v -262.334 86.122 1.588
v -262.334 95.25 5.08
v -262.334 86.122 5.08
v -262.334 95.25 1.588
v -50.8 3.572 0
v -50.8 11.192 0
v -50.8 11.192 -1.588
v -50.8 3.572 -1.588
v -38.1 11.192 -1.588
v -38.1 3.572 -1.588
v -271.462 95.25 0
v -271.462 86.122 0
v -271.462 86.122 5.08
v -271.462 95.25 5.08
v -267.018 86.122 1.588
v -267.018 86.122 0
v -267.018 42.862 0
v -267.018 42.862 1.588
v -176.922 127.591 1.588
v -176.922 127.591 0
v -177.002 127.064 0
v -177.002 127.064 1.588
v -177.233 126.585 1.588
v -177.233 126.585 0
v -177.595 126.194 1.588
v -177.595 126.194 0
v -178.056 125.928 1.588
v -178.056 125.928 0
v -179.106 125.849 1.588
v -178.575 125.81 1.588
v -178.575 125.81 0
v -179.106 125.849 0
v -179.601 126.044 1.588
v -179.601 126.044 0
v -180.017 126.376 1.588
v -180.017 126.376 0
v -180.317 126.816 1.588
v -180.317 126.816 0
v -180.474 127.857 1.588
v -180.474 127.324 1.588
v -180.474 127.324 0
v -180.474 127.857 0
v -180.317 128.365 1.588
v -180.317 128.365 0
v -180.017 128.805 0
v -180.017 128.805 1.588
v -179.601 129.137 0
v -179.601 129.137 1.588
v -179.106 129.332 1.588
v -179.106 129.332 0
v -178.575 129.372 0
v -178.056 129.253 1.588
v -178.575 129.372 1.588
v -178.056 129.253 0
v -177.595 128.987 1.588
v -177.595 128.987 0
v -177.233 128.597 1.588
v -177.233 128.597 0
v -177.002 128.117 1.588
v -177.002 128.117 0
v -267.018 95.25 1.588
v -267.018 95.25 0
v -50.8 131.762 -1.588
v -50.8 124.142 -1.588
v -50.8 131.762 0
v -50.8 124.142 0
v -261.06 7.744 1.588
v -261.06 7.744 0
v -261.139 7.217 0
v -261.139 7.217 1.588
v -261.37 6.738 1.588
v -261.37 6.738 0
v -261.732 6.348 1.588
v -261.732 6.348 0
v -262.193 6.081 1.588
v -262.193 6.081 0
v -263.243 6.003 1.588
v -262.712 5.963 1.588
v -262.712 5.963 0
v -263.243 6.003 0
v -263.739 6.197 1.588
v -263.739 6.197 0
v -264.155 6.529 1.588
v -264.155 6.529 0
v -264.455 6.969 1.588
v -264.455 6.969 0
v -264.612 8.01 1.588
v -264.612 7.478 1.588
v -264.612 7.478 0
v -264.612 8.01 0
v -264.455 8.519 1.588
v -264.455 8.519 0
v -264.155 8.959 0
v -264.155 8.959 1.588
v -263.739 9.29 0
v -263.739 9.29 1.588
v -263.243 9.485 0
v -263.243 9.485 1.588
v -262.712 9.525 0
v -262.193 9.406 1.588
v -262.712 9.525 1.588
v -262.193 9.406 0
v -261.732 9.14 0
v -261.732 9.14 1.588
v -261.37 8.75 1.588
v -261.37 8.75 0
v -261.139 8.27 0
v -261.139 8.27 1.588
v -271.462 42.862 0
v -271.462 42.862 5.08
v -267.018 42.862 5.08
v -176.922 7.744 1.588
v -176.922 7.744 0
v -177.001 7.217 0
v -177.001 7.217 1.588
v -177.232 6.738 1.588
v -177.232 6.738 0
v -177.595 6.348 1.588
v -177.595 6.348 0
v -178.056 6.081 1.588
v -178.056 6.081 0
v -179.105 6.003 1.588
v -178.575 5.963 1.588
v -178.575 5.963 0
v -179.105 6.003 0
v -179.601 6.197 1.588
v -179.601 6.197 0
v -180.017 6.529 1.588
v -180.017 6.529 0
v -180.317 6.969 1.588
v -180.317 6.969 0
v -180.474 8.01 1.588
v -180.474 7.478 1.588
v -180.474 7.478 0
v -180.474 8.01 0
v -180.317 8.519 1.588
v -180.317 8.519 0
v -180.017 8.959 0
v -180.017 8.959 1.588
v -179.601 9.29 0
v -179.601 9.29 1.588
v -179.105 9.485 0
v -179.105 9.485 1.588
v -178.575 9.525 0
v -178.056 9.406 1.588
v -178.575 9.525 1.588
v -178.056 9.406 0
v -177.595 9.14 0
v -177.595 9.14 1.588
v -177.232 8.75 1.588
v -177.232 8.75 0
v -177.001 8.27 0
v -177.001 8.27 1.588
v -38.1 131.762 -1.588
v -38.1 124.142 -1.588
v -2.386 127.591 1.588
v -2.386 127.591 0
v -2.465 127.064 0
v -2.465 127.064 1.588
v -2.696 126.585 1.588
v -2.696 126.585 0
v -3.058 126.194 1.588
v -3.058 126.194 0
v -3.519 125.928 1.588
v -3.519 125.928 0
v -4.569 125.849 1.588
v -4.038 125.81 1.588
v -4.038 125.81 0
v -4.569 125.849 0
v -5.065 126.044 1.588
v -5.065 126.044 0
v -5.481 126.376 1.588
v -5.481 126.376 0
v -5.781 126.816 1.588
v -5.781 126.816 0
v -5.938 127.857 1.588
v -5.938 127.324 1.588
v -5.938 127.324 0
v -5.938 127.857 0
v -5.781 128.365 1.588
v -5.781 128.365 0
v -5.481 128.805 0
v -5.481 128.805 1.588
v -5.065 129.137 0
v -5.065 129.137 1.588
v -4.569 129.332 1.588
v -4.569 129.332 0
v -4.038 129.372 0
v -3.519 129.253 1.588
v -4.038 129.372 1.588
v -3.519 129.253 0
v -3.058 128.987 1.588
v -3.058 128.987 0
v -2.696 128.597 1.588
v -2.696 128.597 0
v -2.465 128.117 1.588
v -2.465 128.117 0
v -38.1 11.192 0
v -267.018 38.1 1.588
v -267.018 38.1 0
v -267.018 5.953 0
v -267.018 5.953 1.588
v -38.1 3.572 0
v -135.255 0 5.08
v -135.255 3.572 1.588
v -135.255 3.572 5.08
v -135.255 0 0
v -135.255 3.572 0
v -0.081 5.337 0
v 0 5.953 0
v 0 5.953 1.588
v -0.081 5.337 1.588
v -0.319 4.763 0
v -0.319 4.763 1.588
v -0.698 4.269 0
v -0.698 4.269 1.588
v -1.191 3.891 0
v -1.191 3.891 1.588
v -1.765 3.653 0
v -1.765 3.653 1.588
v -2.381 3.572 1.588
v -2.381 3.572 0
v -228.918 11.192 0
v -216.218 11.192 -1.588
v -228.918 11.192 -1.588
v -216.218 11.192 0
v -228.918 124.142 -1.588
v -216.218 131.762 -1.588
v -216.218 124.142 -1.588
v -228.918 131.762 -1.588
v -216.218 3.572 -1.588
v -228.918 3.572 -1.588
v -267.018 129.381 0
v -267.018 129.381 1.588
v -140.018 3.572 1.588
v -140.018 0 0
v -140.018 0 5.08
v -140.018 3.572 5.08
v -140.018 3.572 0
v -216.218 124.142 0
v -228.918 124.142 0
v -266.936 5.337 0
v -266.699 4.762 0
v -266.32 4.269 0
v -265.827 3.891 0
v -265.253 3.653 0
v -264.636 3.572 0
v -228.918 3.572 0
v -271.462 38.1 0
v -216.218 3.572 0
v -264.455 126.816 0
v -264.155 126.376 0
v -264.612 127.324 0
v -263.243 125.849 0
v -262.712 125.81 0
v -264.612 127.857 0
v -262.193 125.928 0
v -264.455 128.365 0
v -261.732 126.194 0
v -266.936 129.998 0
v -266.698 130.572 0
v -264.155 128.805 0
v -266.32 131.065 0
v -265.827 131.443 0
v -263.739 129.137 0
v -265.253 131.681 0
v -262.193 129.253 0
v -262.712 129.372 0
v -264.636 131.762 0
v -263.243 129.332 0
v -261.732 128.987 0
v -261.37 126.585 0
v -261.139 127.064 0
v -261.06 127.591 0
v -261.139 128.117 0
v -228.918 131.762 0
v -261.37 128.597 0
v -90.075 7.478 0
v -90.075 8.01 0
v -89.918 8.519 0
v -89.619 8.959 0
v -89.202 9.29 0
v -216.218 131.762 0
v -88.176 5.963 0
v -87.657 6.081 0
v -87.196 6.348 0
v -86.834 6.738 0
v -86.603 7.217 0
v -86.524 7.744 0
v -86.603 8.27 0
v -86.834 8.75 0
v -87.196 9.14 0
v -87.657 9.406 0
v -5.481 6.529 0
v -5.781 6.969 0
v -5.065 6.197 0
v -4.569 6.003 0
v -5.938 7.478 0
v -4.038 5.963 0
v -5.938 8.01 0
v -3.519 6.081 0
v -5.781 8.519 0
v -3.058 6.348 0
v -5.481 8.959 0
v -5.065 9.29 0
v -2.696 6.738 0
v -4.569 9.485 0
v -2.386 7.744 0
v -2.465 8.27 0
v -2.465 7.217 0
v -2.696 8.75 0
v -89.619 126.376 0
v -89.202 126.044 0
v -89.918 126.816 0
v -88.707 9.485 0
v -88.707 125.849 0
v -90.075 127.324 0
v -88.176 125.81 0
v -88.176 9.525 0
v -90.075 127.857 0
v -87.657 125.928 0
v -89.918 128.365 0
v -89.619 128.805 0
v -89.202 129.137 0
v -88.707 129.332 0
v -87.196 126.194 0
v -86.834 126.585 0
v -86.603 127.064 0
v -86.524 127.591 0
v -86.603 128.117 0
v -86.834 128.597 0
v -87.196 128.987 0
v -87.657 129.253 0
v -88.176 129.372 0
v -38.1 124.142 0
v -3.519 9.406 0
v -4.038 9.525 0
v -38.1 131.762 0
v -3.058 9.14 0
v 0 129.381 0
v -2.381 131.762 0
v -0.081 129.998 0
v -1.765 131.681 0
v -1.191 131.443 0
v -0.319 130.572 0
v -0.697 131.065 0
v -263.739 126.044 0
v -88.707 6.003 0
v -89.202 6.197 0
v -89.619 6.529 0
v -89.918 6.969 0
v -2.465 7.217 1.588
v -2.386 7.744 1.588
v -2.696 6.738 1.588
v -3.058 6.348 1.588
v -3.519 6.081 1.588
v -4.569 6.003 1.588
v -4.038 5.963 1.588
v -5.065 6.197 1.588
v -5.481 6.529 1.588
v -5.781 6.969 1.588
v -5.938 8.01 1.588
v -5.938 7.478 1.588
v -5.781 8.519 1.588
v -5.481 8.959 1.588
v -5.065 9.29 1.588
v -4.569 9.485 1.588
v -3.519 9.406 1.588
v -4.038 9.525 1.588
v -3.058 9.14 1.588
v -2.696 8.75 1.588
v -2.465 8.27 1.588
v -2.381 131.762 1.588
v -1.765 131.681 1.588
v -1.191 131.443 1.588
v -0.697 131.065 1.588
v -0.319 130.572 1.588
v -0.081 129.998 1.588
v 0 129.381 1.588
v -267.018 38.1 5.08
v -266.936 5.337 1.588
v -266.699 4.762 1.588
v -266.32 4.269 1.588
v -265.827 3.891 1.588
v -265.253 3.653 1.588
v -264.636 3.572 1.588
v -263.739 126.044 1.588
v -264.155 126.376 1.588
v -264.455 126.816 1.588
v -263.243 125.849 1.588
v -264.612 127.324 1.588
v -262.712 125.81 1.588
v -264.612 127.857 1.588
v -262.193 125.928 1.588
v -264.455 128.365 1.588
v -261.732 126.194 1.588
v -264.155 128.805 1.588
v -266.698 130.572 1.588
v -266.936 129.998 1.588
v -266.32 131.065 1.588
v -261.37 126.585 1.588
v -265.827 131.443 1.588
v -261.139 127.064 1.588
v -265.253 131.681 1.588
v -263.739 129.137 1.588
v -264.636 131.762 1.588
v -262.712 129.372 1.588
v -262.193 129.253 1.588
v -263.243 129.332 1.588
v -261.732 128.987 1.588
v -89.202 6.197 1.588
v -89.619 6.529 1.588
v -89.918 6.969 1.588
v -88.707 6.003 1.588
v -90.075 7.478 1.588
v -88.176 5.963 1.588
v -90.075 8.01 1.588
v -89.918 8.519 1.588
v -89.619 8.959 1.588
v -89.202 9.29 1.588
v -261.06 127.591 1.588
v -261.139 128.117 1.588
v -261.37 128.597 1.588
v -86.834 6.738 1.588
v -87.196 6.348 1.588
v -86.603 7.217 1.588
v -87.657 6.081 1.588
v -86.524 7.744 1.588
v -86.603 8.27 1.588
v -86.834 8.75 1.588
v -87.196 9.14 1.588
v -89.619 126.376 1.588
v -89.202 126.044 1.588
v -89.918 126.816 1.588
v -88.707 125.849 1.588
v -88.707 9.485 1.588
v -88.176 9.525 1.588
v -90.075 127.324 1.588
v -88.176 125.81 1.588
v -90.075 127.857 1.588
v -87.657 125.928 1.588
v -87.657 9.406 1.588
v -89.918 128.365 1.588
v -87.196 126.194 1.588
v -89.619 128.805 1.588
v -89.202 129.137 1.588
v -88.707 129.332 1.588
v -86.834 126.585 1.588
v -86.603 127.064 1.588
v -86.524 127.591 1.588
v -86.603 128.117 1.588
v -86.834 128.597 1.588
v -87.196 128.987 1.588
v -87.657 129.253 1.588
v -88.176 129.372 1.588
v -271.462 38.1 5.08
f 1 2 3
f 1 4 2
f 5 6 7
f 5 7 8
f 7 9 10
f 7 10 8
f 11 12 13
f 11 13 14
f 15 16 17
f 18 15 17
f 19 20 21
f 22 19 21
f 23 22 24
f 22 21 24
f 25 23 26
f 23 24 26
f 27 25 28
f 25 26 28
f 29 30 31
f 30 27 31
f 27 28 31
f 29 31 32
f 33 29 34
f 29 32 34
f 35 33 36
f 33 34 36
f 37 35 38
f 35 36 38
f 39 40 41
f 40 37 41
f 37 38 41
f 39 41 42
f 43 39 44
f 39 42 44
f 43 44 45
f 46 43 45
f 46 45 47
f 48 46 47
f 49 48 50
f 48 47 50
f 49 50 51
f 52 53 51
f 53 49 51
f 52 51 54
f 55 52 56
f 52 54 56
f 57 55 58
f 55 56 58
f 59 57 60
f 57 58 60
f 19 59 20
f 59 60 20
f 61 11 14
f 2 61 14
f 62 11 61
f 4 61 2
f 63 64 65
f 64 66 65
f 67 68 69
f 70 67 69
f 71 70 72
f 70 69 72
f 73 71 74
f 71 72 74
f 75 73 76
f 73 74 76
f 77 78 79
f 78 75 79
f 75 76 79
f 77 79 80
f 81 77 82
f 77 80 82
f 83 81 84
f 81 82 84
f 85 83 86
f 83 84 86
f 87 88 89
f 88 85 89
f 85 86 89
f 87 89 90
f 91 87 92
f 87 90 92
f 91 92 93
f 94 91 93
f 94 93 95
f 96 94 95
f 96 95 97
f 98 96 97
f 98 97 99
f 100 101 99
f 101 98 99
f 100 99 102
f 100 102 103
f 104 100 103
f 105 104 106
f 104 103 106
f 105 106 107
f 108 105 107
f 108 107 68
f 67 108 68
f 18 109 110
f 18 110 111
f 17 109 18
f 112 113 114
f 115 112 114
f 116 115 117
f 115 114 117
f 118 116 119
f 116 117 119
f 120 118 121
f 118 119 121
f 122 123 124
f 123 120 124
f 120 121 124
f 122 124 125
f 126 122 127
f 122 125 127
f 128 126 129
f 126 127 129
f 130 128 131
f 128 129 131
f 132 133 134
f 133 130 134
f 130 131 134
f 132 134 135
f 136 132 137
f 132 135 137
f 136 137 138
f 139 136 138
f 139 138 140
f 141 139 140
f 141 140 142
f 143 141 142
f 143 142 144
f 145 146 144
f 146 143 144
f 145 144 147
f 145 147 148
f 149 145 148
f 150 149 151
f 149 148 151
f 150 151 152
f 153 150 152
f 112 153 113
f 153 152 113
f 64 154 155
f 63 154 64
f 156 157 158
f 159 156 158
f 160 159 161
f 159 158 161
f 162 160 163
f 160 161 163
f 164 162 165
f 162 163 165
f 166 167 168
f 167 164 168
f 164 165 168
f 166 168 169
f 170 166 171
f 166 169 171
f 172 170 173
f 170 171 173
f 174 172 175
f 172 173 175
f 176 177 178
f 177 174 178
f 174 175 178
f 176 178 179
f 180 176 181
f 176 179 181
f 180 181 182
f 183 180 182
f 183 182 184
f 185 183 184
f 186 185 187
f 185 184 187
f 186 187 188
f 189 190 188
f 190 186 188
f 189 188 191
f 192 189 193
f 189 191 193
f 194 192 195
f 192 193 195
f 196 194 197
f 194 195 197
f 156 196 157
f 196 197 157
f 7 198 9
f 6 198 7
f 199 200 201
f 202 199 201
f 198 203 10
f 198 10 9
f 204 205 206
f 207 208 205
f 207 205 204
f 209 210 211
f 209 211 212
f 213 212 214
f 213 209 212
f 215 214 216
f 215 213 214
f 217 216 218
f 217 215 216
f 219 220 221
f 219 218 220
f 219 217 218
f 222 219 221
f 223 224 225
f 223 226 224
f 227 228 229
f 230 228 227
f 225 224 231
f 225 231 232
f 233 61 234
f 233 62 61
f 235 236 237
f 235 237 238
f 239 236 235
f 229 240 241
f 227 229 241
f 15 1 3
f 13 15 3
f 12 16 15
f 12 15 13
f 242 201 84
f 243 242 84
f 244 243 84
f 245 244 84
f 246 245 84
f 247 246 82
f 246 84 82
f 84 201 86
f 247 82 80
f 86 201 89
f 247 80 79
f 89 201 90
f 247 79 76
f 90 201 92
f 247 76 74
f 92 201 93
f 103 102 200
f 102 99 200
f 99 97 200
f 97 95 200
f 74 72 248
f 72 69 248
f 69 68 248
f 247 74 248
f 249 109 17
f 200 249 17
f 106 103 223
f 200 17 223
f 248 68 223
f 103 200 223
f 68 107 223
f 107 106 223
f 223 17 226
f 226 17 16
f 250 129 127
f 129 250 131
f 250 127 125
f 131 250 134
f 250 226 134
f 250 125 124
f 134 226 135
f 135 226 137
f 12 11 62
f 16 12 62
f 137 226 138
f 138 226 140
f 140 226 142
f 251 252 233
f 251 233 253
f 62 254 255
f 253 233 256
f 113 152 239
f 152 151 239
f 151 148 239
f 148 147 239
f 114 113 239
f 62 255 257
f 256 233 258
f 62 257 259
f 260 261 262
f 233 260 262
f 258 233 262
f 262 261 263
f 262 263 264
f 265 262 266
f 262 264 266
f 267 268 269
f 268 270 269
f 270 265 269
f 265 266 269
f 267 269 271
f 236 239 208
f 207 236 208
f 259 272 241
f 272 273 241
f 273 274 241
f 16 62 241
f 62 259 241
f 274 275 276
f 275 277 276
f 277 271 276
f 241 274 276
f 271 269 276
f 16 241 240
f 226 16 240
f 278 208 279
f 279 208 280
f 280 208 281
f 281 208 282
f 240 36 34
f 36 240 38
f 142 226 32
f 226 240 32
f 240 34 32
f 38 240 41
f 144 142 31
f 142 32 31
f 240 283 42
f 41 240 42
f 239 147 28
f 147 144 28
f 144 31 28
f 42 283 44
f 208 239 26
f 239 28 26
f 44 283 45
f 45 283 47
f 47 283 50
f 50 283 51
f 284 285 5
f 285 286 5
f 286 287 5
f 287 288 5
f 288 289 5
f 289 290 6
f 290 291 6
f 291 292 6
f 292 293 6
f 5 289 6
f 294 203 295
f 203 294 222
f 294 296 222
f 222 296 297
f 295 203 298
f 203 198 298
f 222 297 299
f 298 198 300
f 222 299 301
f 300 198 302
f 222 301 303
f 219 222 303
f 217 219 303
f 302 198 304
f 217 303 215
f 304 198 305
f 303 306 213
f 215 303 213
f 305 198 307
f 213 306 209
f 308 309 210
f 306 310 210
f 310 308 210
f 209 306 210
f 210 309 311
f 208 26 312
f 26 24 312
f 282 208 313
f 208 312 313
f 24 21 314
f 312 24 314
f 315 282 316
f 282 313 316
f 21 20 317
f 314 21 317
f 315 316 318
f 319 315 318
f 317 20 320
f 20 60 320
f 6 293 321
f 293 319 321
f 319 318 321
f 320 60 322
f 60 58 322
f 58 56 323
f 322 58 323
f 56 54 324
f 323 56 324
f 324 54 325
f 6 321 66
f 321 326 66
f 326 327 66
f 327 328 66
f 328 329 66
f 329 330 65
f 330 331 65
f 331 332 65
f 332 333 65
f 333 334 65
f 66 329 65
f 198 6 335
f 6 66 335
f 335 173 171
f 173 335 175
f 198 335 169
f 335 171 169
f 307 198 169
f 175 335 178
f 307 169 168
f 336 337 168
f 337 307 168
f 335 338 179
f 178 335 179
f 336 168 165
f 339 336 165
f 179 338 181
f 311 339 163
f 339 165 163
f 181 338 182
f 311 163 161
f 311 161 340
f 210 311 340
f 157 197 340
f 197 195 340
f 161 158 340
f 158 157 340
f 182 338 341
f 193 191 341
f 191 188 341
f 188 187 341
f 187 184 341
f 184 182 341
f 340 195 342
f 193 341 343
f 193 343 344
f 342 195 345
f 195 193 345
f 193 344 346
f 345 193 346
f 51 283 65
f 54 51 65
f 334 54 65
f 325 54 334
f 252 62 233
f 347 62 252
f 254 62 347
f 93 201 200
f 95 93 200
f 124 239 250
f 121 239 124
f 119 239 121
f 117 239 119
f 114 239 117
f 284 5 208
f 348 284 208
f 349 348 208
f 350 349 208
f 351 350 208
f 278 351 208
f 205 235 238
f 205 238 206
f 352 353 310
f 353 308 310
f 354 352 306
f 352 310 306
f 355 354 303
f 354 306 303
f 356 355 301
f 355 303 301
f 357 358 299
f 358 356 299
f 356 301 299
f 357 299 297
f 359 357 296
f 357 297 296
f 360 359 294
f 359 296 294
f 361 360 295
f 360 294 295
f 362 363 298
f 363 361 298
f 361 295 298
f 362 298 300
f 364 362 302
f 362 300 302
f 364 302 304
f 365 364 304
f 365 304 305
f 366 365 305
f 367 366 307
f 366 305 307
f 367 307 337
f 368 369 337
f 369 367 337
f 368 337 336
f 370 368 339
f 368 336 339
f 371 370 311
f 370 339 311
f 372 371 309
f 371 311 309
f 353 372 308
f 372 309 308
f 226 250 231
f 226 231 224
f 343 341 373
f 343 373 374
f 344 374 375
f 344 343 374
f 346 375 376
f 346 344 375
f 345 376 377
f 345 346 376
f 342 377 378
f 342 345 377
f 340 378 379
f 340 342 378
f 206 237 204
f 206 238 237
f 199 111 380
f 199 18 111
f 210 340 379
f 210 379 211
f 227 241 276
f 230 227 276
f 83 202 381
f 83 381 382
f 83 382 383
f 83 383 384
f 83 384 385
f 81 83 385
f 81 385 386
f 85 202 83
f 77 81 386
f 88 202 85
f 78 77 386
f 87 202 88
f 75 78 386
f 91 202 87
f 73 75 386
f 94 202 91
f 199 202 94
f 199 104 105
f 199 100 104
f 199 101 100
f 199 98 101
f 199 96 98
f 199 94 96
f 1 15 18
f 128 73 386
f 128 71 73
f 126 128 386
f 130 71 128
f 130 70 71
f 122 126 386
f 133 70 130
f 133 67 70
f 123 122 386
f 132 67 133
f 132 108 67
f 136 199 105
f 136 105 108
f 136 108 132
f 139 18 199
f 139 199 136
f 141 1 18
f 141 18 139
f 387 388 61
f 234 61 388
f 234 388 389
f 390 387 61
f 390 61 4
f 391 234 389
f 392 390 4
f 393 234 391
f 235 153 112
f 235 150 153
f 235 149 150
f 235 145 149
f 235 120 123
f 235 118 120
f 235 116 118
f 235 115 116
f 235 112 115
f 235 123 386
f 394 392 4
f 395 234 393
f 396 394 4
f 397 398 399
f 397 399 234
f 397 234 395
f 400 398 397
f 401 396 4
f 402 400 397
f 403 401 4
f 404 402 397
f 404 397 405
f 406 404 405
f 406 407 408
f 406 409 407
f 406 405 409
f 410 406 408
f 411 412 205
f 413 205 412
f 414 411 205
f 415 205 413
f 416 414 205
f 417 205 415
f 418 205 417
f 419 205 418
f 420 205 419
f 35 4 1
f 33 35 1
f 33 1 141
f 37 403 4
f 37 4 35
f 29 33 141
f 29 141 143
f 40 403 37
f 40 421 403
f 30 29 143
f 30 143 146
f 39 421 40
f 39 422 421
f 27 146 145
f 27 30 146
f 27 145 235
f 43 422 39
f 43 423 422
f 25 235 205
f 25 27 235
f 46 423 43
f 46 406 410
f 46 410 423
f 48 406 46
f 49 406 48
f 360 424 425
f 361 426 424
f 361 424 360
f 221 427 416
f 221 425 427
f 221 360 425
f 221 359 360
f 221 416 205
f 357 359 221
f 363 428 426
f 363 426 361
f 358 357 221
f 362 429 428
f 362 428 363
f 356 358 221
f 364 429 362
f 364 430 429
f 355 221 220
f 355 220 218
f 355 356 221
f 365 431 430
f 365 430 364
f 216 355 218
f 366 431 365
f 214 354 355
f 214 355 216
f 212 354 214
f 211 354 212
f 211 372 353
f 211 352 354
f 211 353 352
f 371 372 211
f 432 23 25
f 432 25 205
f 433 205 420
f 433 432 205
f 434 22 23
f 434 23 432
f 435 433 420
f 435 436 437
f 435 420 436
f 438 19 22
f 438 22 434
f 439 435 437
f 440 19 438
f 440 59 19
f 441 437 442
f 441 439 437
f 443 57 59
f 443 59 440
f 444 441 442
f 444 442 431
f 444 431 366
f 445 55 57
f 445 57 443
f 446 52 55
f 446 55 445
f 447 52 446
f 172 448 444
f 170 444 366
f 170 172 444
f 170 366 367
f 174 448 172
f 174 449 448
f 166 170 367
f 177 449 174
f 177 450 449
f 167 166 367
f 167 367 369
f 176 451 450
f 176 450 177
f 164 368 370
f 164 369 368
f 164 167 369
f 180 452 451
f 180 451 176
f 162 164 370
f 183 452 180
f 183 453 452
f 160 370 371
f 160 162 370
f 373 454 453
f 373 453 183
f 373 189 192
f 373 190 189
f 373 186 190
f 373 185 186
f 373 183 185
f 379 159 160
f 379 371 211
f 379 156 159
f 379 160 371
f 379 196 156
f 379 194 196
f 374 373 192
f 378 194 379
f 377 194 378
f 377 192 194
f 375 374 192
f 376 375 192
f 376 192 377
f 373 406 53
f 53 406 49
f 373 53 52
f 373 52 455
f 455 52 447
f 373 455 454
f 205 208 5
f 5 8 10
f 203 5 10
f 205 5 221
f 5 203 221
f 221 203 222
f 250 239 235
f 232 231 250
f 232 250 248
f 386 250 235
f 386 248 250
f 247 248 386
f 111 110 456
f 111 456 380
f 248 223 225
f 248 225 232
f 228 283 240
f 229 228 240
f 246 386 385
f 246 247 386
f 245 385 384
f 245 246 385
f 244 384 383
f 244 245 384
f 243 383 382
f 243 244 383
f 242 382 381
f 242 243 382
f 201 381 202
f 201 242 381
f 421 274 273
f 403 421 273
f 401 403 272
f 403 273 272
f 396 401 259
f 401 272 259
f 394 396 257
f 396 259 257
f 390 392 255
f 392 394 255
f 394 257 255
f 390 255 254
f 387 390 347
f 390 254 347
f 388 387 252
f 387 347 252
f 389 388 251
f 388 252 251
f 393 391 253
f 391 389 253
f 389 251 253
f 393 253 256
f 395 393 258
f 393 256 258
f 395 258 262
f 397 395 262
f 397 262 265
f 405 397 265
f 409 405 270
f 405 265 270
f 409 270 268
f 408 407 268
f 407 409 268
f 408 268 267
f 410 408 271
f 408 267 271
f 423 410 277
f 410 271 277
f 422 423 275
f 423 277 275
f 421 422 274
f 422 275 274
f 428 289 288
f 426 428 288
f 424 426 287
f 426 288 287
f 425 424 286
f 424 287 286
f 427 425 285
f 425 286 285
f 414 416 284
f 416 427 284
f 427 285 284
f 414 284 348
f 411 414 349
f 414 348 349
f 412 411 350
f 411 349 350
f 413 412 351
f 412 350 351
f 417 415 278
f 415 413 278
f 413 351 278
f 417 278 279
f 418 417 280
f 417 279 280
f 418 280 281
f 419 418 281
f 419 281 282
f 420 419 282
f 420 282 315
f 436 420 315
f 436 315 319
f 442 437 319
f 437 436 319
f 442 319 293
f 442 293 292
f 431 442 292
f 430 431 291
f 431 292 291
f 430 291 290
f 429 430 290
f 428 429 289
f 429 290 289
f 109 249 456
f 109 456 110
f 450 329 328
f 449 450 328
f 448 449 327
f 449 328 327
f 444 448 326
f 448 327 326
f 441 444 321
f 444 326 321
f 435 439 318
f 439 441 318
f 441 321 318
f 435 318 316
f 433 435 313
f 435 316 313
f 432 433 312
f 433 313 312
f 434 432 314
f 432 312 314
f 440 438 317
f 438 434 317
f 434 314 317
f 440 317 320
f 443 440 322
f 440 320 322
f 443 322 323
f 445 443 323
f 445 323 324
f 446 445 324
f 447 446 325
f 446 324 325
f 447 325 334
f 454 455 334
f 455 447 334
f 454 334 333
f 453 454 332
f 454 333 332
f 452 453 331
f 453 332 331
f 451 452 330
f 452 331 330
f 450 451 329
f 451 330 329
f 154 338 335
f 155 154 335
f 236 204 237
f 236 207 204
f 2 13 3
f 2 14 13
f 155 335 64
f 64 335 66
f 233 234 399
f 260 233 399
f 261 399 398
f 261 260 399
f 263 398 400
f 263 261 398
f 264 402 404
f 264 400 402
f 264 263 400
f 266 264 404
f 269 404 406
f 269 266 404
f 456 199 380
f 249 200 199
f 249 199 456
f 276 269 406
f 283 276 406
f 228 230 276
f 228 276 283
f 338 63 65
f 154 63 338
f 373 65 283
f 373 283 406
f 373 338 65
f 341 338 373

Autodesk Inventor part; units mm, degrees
ref_plane "YZ Plane" through (0, 0, 0) normal (1, 0, 0) x (0, 1, 0)
ref_plane "XZ Plane" through (0, 0, 0) normal (0, 1, 0) x (-1, 0, 0)
ref_plane "XY Plane" through (0, 0, 0) normal (0, 0, 1) x (1, 0, 0)
sketch "CircuitBoard" plane through (0, 0, 0) normal (0, 0, 1) x (1, 0, 0)
  line L0 (-271.4625, 131.7625) -> (-267.0175, 131.7625) construction
  line L1 (0, 129.3813) -> (0, 5.9531)
  line L2 (0, 0) -> (-267.0175, 0) construction
  line L3 (-271.4625, 0) -> (-271.4625, 131.7625) construction
  line L4 (-271.4625, 95.25) -> (-267.0175, 95.25)
  line L5 (-267.0175, 95.25) -> (-267.0175, 86.1219) construction
  line L6 (-267.0175, 86.1219) -> (-271.4625, 86.1219)
  line L7 (-271.4625, 86.1219) -> (-271.4625, 95.25)
  line L8 (-271.4625, 95.25) -> (-262.3344, 95.25)
  line L9 (-262.3344, 95.25) -> (-262.3344, 86.1219)
  line L10 (-262.3344, 86.1219) -> (-271.4625, 86.1219)
  line L11 (-271.4625, 86.1219) -> (-271.4625, 95.25)
  line L12 (-267.0175, 95.25) -> (-267.0175, 129.3813)
  line L13 (-264.6363, 131.7625) -> (-2.3812, 131.7625)
  line L14 (-267.0175, 86.1219) -> (-267.0175, 5.9531)
  line L15 (-267.0175, 0) -> (-271.4625, 0) construction
  line L16 (-135.255, 0) -> (-140.0175, 0)
  line L17 (-140.0175, 0) -> (-140.0175, 3.5719)
  line L18 (-140.0175, 3.5719) -> (-135.255, 3.5719)
  line L19 (-135.255, 3.5719) -> (-135.255, 0)
  line L20 (-140.0175, 0) -> (-135.255, 0)
  line L21 (-135.255, 0) -> (-135.255, -1.5875)
  line L22 (-135.255, -1.5875) -> (-140.0175, -1.5875)
  line L23 (-140.0175, -1.5875) -> (-140.0175, 0)
  line L24 (-271.4625, 42.8625) -> (-267.0175, 42.8625)
  line L25 (-267.0175, 42.8625) -> (-267.0175, 38.1)
  line L26 (-267.0175, 38.1) -> (-271.4625, 38.1)
  line L27 (-271.4625, 38.1) -> (-271.4625, 42.8625)
  circle A0 centre (-262.8456, 127.5906) radius 1.7859
  arc A1 (-264.6363, 131.7625) -> (-267.0175, 129.3813) centre (-264.6362, 129.3813) ccw
  arc A2 (0, 129.3813) -> (-2.3812, 131.7625) centre (-2.3812, 129.3813) ccw
  circle A3 centre (-178.7081, 127.5906) radius 1.7859
  line L28 (-262.8456, 127.5906) -> (-178.7081, 127.5906) construction
  line L29 (-271.4625, 42.8625) -> (-273.05, 42.8625)
  line L30 (-273.05, 42.8625) -> (-273.05, 38.1)
  line L31 (-273.05, 38.1) -> (-271.4625, 38.1)
  line L32 (-271.4625, 38.1) -> (-271.4625, 42.8625)
  line L33 (-140.0175, 3.5719) -> (-264.6363, 3.5719)
  line L34 (-135.255, 3.5719) -> (-2.3813, 3.5719)
  line L35 (0, 3.5719) -> (0, 0) construction
  arc A4 (-267.0175, 5.9531) -> (-264.6363, 3.5719) centre (-264.6362, 5.9531) ccw
  arc A5 (-2.3813, 3.5719) -> (0, 5.9531) centre (-2.3813, 5.9531) ccw
  line L36 (-267.0175, 67.6672) -> (0, 67.6672) construction
  line L37 (-133.5087, 131.7625) -> (-133.5088, 3.5719) construction
  circle A6 centre (-4.1719, 127.5906) radius 1.7859
  circle A7 centre (-88.3094, 127.5906) radius 1.7859
  circle A8 centre (-262.8456, 7.7438) radius 1.7859
  circle A9 centre (-178.708, 7.7438) radius 1.7859
  circle A10 centre (-4.1719, 7.7438) radius 1.7859
  circle A11 centre (-88.3094, 7.7438) radius 1.7859
  point P0 (0, 131.7625)
  point P1 (-133.5088, 67.6672)
  dimension "d44" = 271.4625
  dimension "d45" = 131.7625
  dimension "d46" = 4.445
  dimension "d47" = 9.1281
  dimension "d48" = 36.5125
  dimension "d49" = 9.1281
  dimension "d50" = 131.7625
  dimension "d51" = 4.7625
  dimension "d52" = 3.5719
  dimension "d53" = 1.5875
  dimension "d54" = 4.7625
  dimension "d55" = 38.1
  dimension "d56" = 3.5719
  dimension "d57" = 4.1719
  dimension "d58" = 4.1719
  dimension "d59" = 2.3813
  dimension "d60" = 84.1375
  dimension "d61" = 1.5875
  dimension "d62" = 2.3813
  dimension "d65" = 88.3094
extrude "CircuitBoardFeature" add sketch "CircuitBoard" along normal blind 1.5875 contours L1 A5 L34 L18 L33 A4 L14 L10 L9 L8 L12 A1 L13 A2 | L19 L16 L17 L18 | L8 L9 L10 L6 L7 L4 | L26 L27 L24 L14
extrude "TopFeatures" add sketch "CircuitBoard" along normal blind 5.08 contours L19 L16 L17 L18 | L8 L9 L10 L6 L7 L4 | L26 L27 L24 L14
sketch "BottomProfile" plane through (0, 0, 0) normal (0, 0, -1) x (-1, 0, 0)
  line L0 (264.6363, 3.5719) -> (140.0175, 3.5719) construction
  line L1 (228.9175, 3.5719) -> (216.2175, 3.5719)
  line L2 (216.2175, 3.5719) -> (216.2175, 11.1919)
  line L3 (216.2175, 11.1919) -> (228.9175, 11.1919)
  line L4 (228.9175, 11.1919) -> (228.9175, 3.5719)
  line L5 (135.255, 3.5719) -> (2.3813, 3.5719) construction
  line L6 (50.8, 3.5719) -> (38.1, 3.5719)
  line L7 (38.1, 3.5719) -> (38.1, 11.1919)
  line L8 (38.1, 11.1919) -> (50.8, 11.1919)
  line L9 (50.8, 11.1919) -> (50.8, 3.5719)
  line L10 (0, 5.9531) -> (0, 129.3813) construction
  line L11 (0, 67.6672) -> (267.0175, 67.6672) construction
  line L12 (267.0175, 86.1219) -> (267.0175, 42.8625) projected
  line L13 (267.0175, 38.1) -> (267.0175, 5.9531) projected
  line L14 (228.9175, 131.7625) -> (216.2175, 131.7625)
  line L15 (216.2175, 131.7625) -> (216.2175, 124.1425)
  line L16 (216.2175, 124.1425) -> (228.9175, 124.1425)
  line L17 (228.9175, 124.1425) -> (228.9175, 131.7625)
  line L18 (50.8, 131.7625) -> (38.1, 131.7625)
  line L19 (38.1, 131.7625) -> (38.1, 124.1425)
  line L20 (38.1, 124.1425) -> (50.8, 124.1425)
  line L21 (50.8, 124.1425) -> (50.8, 131.7625)
  point P0 (0, 0)
  dimension "d70" = 38.1
  dimension "d71" = 38.1
  dimension "d72" = 12.7
  dimension "d73" = 7.62
extrude "BottomFeatures" add sketch "BottomProfile" along normal blind 1.5875
equation "\"d58\" = d57"
properties part number "seaboard-block-circuit-board"
